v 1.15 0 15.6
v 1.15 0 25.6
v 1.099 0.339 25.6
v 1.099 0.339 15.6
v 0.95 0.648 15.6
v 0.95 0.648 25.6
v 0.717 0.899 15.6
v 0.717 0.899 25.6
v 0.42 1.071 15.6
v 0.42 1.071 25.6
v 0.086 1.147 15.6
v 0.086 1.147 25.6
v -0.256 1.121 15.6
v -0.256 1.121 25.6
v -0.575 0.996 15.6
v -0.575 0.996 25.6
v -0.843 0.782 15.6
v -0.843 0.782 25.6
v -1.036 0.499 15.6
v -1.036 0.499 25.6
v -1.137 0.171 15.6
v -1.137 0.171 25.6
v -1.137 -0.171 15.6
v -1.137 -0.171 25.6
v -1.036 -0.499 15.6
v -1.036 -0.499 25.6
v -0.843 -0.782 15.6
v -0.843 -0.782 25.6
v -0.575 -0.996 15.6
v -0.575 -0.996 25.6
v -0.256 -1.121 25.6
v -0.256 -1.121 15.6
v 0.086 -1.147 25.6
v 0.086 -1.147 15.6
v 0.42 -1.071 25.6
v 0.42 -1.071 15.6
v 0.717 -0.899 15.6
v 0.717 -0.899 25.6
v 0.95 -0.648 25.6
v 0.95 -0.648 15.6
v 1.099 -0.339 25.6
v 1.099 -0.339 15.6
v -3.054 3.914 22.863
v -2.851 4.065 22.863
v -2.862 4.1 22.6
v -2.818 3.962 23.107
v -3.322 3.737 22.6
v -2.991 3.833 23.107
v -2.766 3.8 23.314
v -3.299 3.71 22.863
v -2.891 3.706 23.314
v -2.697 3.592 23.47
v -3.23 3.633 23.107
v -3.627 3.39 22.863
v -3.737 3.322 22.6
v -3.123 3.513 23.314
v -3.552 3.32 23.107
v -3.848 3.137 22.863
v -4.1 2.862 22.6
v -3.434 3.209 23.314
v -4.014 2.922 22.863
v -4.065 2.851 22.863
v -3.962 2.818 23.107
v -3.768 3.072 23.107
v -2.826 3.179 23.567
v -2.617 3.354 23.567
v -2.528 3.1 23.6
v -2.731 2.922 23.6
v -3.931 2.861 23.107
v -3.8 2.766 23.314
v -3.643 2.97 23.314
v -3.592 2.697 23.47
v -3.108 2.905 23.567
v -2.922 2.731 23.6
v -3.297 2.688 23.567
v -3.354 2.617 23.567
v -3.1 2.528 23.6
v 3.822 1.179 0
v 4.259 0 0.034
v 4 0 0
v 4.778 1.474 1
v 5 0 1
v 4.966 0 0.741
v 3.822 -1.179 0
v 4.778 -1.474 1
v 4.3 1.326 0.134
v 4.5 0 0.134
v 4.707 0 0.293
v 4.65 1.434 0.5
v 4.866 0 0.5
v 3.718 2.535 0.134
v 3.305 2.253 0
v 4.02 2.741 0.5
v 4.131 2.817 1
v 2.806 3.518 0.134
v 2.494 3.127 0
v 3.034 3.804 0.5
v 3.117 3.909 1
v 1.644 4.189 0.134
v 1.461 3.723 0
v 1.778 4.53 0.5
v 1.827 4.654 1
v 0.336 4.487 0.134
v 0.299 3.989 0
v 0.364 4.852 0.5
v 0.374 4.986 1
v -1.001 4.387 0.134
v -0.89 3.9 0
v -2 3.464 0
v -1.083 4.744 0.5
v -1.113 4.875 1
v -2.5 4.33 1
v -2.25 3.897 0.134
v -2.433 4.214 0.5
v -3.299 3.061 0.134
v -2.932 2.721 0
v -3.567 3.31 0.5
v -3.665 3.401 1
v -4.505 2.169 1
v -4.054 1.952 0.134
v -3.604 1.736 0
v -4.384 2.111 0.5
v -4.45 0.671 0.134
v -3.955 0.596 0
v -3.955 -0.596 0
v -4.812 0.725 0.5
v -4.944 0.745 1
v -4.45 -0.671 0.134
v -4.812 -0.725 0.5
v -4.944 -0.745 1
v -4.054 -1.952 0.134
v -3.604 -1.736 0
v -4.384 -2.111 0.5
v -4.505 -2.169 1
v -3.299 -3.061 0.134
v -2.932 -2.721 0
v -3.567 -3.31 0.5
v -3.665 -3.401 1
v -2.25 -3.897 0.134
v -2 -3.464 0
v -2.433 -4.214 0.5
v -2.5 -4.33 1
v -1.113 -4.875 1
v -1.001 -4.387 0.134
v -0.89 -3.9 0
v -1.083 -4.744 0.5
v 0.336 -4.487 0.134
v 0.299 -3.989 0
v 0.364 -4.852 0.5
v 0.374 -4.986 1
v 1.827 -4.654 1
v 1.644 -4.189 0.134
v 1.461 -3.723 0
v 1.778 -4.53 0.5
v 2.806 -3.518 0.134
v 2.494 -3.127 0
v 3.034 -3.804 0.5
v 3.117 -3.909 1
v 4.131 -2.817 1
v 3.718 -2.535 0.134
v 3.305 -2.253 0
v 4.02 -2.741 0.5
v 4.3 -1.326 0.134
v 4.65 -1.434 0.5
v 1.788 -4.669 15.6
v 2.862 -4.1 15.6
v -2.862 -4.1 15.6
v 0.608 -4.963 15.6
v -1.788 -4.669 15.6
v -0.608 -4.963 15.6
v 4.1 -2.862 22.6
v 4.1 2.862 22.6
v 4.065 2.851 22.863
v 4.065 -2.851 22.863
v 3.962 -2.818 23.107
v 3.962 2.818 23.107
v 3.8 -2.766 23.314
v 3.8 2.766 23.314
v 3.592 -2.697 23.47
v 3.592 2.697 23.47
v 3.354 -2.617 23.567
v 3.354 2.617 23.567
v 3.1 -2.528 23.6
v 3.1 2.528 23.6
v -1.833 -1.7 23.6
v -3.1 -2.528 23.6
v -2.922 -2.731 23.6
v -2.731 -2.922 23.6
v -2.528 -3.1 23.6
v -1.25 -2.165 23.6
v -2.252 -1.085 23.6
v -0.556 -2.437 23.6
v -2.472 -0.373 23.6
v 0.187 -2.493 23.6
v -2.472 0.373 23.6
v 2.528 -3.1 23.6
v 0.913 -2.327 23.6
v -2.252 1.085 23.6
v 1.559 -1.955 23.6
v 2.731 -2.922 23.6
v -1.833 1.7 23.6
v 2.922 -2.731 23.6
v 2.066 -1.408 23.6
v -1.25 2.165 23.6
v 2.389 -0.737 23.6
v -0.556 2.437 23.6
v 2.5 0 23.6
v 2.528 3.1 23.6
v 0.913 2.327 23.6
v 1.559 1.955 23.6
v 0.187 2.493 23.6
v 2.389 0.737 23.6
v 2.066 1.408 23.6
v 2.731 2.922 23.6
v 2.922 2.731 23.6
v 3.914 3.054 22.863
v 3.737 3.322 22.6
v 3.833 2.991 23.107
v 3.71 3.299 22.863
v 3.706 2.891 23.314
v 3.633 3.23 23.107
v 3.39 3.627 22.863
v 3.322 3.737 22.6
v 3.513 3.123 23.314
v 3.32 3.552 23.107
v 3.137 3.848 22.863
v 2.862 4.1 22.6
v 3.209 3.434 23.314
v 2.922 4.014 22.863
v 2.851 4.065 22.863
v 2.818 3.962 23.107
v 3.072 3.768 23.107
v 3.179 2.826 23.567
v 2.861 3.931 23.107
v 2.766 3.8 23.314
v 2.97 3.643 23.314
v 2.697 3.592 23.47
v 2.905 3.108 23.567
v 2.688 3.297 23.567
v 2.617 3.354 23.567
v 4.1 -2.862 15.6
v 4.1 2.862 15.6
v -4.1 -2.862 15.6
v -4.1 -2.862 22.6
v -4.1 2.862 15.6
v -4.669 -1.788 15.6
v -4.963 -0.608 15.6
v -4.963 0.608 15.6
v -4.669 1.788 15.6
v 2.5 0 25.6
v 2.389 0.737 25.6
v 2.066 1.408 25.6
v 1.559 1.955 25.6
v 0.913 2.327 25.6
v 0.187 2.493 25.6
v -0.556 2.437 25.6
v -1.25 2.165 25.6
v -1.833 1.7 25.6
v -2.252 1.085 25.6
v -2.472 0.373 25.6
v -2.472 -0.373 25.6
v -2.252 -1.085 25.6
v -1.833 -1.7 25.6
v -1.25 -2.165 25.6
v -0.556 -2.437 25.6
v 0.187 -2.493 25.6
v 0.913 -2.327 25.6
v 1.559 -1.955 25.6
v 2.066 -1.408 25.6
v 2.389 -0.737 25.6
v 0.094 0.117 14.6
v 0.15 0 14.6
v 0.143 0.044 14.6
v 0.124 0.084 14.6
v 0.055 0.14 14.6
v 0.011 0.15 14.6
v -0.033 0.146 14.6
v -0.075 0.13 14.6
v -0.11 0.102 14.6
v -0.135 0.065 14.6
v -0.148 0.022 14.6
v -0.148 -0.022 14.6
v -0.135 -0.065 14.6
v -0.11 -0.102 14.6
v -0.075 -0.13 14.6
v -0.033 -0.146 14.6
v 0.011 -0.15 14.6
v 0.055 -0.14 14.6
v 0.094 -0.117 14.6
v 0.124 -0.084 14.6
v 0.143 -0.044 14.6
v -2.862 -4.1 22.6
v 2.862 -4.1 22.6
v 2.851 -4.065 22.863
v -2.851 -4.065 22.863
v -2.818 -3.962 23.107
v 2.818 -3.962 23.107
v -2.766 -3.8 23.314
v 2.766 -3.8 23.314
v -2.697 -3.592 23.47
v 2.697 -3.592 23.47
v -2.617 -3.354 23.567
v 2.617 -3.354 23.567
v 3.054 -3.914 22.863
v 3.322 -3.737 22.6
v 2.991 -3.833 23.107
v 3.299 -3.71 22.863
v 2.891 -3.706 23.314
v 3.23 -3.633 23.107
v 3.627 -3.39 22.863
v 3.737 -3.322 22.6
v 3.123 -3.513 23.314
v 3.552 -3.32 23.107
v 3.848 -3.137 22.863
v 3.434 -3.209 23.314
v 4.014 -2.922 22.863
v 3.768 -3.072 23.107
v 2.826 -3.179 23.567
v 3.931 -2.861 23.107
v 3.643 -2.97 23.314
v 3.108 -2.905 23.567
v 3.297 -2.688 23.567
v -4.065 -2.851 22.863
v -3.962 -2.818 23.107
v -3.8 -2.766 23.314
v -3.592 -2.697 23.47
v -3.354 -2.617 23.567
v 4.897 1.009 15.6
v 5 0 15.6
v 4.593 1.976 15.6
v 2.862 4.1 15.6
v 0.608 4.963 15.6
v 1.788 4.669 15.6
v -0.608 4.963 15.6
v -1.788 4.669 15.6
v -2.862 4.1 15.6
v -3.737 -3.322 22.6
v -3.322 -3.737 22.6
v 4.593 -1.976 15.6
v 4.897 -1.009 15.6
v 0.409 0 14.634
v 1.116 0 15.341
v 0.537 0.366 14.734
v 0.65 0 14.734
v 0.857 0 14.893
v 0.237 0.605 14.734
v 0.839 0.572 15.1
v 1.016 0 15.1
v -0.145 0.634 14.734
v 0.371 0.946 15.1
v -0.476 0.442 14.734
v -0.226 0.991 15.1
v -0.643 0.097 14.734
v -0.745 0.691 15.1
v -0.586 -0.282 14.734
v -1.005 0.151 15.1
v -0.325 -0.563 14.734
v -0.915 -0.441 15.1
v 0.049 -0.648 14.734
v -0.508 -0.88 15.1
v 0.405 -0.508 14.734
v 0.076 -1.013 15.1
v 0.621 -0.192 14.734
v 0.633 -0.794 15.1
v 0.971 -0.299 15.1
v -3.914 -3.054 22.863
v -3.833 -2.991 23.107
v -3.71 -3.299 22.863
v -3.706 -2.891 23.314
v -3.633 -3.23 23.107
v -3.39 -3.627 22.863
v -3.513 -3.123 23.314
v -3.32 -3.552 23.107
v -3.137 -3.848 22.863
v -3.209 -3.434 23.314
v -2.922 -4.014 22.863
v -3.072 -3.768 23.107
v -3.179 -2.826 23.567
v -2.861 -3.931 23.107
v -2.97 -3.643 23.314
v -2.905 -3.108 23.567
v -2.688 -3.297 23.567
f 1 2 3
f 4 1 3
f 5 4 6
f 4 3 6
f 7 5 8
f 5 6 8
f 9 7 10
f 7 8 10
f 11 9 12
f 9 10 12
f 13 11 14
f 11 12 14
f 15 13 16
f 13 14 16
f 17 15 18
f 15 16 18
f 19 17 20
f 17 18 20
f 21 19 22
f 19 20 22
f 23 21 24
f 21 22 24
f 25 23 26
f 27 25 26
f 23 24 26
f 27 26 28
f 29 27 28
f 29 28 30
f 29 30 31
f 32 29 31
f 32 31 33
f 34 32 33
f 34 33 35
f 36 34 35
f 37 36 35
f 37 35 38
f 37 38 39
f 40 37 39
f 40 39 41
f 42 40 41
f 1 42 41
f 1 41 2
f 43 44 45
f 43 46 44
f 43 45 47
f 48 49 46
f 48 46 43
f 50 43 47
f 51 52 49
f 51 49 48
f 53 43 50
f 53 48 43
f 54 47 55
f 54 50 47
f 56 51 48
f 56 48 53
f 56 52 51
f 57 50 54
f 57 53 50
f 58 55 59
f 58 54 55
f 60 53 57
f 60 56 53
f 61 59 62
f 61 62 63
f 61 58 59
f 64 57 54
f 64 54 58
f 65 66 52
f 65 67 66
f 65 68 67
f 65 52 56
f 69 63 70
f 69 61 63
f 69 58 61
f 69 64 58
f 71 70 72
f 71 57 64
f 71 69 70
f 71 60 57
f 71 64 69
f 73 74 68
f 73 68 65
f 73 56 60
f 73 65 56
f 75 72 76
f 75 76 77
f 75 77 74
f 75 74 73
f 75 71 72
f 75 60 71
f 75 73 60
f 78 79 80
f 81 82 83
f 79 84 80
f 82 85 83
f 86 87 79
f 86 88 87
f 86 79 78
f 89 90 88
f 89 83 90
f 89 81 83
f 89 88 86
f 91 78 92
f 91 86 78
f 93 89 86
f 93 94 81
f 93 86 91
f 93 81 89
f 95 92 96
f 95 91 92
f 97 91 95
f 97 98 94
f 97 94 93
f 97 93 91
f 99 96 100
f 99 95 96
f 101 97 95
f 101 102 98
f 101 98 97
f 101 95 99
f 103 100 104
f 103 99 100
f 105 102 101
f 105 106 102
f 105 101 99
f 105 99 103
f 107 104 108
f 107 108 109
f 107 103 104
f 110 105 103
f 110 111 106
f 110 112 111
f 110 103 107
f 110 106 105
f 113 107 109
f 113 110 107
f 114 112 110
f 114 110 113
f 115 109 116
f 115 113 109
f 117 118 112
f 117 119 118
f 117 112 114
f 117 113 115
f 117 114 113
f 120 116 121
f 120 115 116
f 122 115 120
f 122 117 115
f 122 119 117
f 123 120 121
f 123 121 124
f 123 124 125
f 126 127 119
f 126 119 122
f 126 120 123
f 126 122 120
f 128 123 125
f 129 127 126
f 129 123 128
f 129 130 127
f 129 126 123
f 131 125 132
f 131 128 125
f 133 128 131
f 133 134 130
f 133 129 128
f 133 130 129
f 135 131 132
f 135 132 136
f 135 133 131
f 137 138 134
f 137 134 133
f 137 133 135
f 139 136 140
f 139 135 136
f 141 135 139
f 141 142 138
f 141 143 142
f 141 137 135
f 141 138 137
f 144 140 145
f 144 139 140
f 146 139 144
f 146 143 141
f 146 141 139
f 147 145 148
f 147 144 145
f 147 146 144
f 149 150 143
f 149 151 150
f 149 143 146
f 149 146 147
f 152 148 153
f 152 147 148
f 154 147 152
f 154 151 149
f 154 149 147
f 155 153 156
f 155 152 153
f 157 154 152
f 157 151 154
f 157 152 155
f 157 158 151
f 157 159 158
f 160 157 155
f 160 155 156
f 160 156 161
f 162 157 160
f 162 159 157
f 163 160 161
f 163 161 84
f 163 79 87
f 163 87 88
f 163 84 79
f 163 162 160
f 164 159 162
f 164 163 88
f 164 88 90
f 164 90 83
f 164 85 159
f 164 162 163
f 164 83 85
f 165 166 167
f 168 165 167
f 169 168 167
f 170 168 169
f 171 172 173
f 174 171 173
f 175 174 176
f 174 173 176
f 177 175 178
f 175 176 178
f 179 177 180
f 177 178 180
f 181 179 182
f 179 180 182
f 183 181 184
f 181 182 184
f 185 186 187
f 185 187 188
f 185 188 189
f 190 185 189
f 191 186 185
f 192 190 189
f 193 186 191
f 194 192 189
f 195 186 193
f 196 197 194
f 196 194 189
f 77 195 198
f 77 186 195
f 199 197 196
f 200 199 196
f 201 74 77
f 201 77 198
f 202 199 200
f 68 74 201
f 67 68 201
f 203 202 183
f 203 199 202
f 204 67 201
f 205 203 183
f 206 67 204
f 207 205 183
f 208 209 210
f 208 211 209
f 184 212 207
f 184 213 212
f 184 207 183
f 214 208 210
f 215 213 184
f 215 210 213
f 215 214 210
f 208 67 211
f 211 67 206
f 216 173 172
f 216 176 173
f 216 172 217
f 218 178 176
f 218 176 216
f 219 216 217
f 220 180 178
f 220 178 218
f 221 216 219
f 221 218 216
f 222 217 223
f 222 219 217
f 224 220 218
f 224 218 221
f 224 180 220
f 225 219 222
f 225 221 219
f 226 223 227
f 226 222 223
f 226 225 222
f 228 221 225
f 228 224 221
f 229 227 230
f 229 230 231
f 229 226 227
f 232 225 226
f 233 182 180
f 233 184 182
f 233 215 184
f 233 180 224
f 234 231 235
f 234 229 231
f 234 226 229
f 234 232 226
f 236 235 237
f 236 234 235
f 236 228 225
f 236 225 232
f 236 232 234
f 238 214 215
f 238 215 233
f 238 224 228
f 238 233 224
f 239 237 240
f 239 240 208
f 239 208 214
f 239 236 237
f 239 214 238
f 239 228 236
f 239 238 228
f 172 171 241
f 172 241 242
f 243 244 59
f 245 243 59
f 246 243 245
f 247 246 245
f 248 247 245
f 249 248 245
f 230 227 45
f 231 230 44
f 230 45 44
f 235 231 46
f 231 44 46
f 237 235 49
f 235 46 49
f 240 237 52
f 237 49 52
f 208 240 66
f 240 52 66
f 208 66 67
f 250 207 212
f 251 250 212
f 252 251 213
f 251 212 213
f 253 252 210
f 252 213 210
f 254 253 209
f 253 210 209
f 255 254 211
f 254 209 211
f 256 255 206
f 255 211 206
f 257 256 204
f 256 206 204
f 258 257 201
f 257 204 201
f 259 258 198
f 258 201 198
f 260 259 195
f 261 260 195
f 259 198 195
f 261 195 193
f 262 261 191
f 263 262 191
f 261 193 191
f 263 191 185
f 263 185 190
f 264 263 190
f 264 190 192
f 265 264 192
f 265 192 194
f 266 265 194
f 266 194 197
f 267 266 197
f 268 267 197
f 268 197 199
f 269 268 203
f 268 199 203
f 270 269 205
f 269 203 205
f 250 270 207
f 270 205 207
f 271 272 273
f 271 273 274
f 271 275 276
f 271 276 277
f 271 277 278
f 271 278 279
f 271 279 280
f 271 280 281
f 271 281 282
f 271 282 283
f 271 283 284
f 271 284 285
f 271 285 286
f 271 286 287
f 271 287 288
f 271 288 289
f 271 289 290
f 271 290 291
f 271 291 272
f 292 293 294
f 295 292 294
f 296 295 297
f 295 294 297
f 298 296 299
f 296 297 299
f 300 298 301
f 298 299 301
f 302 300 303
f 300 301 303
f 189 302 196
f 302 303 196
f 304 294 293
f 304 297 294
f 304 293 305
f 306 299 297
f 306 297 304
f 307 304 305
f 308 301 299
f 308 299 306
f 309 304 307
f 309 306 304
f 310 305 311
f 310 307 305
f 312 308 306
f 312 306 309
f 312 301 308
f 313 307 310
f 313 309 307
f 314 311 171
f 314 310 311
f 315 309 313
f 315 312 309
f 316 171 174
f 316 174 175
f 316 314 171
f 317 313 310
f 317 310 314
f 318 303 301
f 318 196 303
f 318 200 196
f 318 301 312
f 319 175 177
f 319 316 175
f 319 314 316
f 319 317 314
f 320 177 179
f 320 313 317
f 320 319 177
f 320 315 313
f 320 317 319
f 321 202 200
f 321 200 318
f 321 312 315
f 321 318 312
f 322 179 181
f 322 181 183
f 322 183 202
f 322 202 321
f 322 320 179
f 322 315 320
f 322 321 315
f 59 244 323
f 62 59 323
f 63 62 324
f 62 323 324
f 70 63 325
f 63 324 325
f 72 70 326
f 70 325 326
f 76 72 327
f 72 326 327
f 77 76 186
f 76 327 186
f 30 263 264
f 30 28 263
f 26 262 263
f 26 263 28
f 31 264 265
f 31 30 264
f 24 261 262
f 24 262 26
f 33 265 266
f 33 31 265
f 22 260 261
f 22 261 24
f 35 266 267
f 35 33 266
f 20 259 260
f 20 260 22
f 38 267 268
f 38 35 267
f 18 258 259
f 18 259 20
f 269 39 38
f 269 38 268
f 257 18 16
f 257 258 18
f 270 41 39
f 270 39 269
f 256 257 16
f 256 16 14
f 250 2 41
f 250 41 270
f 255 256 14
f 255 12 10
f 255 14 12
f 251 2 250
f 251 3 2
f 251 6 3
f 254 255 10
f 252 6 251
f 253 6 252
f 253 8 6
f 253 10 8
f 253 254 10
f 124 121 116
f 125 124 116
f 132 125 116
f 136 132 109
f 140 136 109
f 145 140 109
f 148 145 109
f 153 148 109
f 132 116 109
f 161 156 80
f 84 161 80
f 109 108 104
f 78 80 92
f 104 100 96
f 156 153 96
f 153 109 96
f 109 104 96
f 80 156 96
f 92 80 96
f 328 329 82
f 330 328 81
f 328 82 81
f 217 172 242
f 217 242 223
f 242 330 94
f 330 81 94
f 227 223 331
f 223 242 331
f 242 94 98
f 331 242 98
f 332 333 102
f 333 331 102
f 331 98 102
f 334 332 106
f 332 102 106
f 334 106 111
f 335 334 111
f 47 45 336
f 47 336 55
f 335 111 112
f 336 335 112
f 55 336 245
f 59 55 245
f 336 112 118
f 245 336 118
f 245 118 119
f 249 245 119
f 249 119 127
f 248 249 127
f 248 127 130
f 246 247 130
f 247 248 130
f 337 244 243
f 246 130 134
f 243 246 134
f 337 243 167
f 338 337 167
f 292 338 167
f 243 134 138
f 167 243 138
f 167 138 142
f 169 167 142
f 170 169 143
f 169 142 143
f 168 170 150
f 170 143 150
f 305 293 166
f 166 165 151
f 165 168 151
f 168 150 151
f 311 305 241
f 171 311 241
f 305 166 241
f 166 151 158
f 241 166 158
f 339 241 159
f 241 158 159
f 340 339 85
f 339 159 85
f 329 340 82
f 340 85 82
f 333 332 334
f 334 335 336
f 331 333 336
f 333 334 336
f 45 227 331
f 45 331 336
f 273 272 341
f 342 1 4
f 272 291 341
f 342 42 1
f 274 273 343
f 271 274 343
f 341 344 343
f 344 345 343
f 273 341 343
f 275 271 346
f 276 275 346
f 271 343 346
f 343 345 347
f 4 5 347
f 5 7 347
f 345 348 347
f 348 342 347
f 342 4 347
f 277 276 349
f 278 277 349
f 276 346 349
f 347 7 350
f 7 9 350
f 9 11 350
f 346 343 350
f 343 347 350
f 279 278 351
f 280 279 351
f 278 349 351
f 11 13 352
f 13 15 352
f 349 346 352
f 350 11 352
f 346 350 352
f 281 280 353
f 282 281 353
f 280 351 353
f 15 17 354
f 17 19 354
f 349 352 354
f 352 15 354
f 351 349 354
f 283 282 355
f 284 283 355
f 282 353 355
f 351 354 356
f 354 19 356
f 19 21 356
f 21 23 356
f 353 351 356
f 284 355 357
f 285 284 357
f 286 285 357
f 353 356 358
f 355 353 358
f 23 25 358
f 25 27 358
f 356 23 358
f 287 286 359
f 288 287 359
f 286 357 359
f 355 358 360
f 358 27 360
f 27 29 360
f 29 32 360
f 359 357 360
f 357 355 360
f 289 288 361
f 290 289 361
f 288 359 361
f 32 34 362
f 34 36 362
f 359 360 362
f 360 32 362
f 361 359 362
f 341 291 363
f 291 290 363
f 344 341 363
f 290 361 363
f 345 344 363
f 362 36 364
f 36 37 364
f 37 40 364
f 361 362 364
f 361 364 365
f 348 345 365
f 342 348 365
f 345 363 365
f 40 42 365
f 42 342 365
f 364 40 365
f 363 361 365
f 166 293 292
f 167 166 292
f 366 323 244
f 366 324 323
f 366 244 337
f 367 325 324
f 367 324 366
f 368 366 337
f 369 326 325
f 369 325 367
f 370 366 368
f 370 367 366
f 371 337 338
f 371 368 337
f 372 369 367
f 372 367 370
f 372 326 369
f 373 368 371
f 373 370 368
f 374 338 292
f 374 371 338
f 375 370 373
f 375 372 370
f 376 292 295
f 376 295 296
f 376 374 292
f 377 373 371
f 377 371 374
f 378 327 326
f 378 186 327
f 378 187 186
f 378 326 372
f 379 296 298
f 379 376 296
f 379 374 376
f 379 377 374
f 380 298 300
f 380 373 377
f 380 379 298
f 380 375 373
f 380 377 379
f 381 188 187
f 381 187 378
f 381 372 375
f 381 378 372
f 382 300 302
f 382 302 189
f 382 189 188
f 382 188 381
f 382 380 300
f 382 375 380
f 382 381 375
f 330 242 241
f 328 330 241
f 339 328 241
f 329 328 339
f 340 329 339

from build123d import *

# Parameters (mm, degrees)
SKICA1_R                 = 5
P_IDAT_VYSUNUT_M1_DEPTH  = 23.6
SKICA2_OUTSIDE_W         = 17.502
SKICA2_OUTSIDE_H         = 17.502
SKICA2_OUTSIDE_W_2       = 8.2
SKICA2_OUTSIDE_H_2       = 8.2
ODEBRAT_VYSUNUT_M1_DEPTH = 8
SKICA3_R                 = 2.5
P_IDAT_VYSUNUT_M2_DEPTH  = 2
SKICA4_R                 = 1.15
ODEBRAT_VYSUNUT_M2_DEPTH = 11
ZAOBLIT1_R               = 1


with BuildPart() as part:
    # Skica1 → Přidat vysunutím1 (new body)
    with BuildSketch(Plane.XY):
        Circle(SKICA1_R)
    extrude(amount=P_IDAT_VYSUNUT_M1_DEPTH)

    # Skica2 outside → Odebrat vysunutím1 (cut)
    with BuildSketch(Plane(origin=(0, 0, 23.6), x_dir=(-1, 0, 0), z_dir=(0, 0, -1))):
        Rectangle(SKICA2_OUTSIDE_W, SKICA2_OUTSIDE_H)
        Rectangle(SKICA2_OUTSIDE_W_2, SKICA2_OUTSIDE_H_2, mode=Mode.SUBTRACT)
    extrude(amount=ODEBRAT_VYSUNUT_M1_DEPTH, mode=Mode.SUBTRACT)

    # Skica3 → Přidat vysunutím2 (add)
    with BuildSketch(Plane.XY.offset(23.6)):
        Circle(SKICA3_R)
    extrude(amount=P_IDAT_VYSUNUT_M2_DEPTH)

    # Skica4 → Odebrat vysunutím2 (cut)
    with BuildSketch(Plane.XY.offset(25.6)):
        Circle(SKICA4_R)
    extrude(amount=-ODEBRAT_VYSUNUT_M2_DEPTH, mode=Mode.SUBTRACT)

    # Zaoblit1
    # the kernel refuses this fillet: 1 mm, written as the material it adds along each edge
    with BuildSketch(Plane(origin=(0, 0, 14.6), x_dir=(1, 0, 0), z_dir=(0, -1, 0))) as zaoblit1_piece_1:
        with BuildLine():
            CenterArc((1.15 - ZAOBLIT1_R, ZAOBLIT1_R), ZAOBLIT1_R, 270, 90)
            Line((1.15 - ZAOBLIT1_R, 0), (1.15, 0))
            Line((1.15, 0), (1.15, ZAOBLIT1_R))
        make_face()
    revolve(axis=Axis((0, 0, 14.6), (0, 0, 1)))
    # the kernel refuses this fillet: 1 mm, written as the material it takes off along each edge
    with BuildSketch(Plane(origin=(0, 0, 0), x_dir=(1, 0, 0), z_dir=(0, -1, 0))) as zaoblit1_2_piece_1:
        with BuildLine():
            CenterArc((5 - ZAOBLIT1_R, ZAOBLIT1_R), ZAOBLIT1_R, 270, 90)
            Line((5 - ZAOBLIT1_R, 0), (5, 0))
            Line((5, 0), (5, ZAOBLIT1_R))
        make_face()
    revolve(axis=Axis((0, 0, 0), (0, 0, 1)), mode=Mode.SUBTRACT)
    with BuildSketch(Plane(origin=(0, 0, 23.6), x_dir=(0.9940244909072117, 0.109157278624279, 0), z_dir=(0.109157278624279, -0.9940244909072117, 0))) as zaoblit1_2_piece_2:
        with BuildLine():
            CenterArc((5 - ZAOBLIT1_R, -ZAOBLIT1_R), ZAOBLIT1_R, 0, 90)
            Line((5 - ZAOBLIT1_R, 0), (5, 0))
            Line((5, 0), (5, -ZAOBLIT1_R))
        make_face()
    revolve(axis=Axis((0, 0, 23.6), (0, 0, 1)), revolution_arc=77.466522668, mode=Mode.SUBTRACT)
    with BuildSketch(Plane(origin=(0, 0, 23.6), x_dir=(-0.10915727862431812, 0.9940244909072075, 0), z_dir=(0.9940244909072075, 0.10915727862431812, 0))) as zaoblit1_2_piece_3:
        with BuildLine():
            CenterArc((5 - ZAOBLIT1_R, -ZAOBLIT1_R), ZAOBLIT1_R, 0, 90)
            Line((5 - ZAOBLIT1_R, 0), (5, 0))
            Line((5, 0), (5, -ZAOBLIT1_R))
        make_face()
    revolve(axis=Axis((0, 0, 23.6), (0, 0, 1)), revolution_arc=77.466522668, mode=Mode.SUBTRACT)
    with BuildSketch(Plane(origin=(0, 0, 23.6), x_dir=(-0.9940244909072075, -0.1091572786243185, 0), z_dir=(-0.1091572786243185, 0.9940244909072075, 0))) as zaoblit1_2_piece_4:
        with BuildLine():
            CenterArc((5 - ZAOBLIT1_R, -ZAOBLIT1_R), ZAOBLIT1_R, 0, 90)
            Line((5 - ZAOBLIT1_R, 0), (5, 0))
            Line((5, 0), (5, -ZAOBLIT1_R))
        make_face()
    revolve(axis=Axis((0, 0, 23.6), (0, 0, 1)), revolution_arc=77.466522668, mode=Mode.SUBTRACT)
    with BuildSketch(Plane(origin=(0, 0, 23.6), x_dir=(0.10915727862436878, -0.9940244909072019, 0), z_dir=(-0.9940244909072019, -0.10915727862436878, 0))) as zaoblit1_2_piece_5:
        with BuildLine():
            CenterArc((5 - ZAOBLIT1_R, -ZAOBLIT1_R), ZAOBLIT1_R, 0, 90)
            Line((5 - ZAOBLIT1_R, 0), (5, 0))
            Line((5, 0), (5, -ZAOBLIT1_R))
        make_face()
    revolve(axis=Axis((0, 0, 23.6), (0, 0, 1)), revolution_arc=77.466522668, mode=Mode.SUBTRACT)
    with BuildSketch(Plane(origin=(5.361817604, -4.1, 23.6), x_dir=(0, 1, 0), z_dir=(-1, 0, 0)), Plane(origin=(-5.361817604, 4.1, 23.6), x_dir=(0, -1, 0), z_dir=(1, 0, 0)), Plane(origin=(-4.1, -5.361817604, 23.6), x_dir=(1, 0, 0), z_dir=(0, 1, 0))) as zaoblit1_2_piece_6:
        with BuildLine():
            CenterArc((ZAOBLIT1_R, ZAOBLIT1_R), ZAOBLIT1_R, 180, 90)
            Line((0, ZAOBLIT1_R), (0, 0))
            Line((0, 0), (ZAOBLIT1_R, 0))
        make_face()
    extrude(amount=10.723635209, mode=Mode.SUBTRACT)
    with BuildSketch(Plane(origin=(4.1, 5.361817604, 23.6), x_dir=(0, 0, -1), z_dir=(0, -1, 0))) as zaoblit1_2_piece_7:
        with BuildLine():
            CenterArc((ZAOBLIT1_R, -ZAOBLIT1_R), ZAOBLIT1_R, 90, 90)
            Line((0, -ZAOBLIT1_R), (0, 0))
            Line((0, 0), (ZAOBLIT1_R, 0))
        make_face()
    extrude(amount=10.723635209, mode=Mode.SUBTRACT)


solid = part.part
